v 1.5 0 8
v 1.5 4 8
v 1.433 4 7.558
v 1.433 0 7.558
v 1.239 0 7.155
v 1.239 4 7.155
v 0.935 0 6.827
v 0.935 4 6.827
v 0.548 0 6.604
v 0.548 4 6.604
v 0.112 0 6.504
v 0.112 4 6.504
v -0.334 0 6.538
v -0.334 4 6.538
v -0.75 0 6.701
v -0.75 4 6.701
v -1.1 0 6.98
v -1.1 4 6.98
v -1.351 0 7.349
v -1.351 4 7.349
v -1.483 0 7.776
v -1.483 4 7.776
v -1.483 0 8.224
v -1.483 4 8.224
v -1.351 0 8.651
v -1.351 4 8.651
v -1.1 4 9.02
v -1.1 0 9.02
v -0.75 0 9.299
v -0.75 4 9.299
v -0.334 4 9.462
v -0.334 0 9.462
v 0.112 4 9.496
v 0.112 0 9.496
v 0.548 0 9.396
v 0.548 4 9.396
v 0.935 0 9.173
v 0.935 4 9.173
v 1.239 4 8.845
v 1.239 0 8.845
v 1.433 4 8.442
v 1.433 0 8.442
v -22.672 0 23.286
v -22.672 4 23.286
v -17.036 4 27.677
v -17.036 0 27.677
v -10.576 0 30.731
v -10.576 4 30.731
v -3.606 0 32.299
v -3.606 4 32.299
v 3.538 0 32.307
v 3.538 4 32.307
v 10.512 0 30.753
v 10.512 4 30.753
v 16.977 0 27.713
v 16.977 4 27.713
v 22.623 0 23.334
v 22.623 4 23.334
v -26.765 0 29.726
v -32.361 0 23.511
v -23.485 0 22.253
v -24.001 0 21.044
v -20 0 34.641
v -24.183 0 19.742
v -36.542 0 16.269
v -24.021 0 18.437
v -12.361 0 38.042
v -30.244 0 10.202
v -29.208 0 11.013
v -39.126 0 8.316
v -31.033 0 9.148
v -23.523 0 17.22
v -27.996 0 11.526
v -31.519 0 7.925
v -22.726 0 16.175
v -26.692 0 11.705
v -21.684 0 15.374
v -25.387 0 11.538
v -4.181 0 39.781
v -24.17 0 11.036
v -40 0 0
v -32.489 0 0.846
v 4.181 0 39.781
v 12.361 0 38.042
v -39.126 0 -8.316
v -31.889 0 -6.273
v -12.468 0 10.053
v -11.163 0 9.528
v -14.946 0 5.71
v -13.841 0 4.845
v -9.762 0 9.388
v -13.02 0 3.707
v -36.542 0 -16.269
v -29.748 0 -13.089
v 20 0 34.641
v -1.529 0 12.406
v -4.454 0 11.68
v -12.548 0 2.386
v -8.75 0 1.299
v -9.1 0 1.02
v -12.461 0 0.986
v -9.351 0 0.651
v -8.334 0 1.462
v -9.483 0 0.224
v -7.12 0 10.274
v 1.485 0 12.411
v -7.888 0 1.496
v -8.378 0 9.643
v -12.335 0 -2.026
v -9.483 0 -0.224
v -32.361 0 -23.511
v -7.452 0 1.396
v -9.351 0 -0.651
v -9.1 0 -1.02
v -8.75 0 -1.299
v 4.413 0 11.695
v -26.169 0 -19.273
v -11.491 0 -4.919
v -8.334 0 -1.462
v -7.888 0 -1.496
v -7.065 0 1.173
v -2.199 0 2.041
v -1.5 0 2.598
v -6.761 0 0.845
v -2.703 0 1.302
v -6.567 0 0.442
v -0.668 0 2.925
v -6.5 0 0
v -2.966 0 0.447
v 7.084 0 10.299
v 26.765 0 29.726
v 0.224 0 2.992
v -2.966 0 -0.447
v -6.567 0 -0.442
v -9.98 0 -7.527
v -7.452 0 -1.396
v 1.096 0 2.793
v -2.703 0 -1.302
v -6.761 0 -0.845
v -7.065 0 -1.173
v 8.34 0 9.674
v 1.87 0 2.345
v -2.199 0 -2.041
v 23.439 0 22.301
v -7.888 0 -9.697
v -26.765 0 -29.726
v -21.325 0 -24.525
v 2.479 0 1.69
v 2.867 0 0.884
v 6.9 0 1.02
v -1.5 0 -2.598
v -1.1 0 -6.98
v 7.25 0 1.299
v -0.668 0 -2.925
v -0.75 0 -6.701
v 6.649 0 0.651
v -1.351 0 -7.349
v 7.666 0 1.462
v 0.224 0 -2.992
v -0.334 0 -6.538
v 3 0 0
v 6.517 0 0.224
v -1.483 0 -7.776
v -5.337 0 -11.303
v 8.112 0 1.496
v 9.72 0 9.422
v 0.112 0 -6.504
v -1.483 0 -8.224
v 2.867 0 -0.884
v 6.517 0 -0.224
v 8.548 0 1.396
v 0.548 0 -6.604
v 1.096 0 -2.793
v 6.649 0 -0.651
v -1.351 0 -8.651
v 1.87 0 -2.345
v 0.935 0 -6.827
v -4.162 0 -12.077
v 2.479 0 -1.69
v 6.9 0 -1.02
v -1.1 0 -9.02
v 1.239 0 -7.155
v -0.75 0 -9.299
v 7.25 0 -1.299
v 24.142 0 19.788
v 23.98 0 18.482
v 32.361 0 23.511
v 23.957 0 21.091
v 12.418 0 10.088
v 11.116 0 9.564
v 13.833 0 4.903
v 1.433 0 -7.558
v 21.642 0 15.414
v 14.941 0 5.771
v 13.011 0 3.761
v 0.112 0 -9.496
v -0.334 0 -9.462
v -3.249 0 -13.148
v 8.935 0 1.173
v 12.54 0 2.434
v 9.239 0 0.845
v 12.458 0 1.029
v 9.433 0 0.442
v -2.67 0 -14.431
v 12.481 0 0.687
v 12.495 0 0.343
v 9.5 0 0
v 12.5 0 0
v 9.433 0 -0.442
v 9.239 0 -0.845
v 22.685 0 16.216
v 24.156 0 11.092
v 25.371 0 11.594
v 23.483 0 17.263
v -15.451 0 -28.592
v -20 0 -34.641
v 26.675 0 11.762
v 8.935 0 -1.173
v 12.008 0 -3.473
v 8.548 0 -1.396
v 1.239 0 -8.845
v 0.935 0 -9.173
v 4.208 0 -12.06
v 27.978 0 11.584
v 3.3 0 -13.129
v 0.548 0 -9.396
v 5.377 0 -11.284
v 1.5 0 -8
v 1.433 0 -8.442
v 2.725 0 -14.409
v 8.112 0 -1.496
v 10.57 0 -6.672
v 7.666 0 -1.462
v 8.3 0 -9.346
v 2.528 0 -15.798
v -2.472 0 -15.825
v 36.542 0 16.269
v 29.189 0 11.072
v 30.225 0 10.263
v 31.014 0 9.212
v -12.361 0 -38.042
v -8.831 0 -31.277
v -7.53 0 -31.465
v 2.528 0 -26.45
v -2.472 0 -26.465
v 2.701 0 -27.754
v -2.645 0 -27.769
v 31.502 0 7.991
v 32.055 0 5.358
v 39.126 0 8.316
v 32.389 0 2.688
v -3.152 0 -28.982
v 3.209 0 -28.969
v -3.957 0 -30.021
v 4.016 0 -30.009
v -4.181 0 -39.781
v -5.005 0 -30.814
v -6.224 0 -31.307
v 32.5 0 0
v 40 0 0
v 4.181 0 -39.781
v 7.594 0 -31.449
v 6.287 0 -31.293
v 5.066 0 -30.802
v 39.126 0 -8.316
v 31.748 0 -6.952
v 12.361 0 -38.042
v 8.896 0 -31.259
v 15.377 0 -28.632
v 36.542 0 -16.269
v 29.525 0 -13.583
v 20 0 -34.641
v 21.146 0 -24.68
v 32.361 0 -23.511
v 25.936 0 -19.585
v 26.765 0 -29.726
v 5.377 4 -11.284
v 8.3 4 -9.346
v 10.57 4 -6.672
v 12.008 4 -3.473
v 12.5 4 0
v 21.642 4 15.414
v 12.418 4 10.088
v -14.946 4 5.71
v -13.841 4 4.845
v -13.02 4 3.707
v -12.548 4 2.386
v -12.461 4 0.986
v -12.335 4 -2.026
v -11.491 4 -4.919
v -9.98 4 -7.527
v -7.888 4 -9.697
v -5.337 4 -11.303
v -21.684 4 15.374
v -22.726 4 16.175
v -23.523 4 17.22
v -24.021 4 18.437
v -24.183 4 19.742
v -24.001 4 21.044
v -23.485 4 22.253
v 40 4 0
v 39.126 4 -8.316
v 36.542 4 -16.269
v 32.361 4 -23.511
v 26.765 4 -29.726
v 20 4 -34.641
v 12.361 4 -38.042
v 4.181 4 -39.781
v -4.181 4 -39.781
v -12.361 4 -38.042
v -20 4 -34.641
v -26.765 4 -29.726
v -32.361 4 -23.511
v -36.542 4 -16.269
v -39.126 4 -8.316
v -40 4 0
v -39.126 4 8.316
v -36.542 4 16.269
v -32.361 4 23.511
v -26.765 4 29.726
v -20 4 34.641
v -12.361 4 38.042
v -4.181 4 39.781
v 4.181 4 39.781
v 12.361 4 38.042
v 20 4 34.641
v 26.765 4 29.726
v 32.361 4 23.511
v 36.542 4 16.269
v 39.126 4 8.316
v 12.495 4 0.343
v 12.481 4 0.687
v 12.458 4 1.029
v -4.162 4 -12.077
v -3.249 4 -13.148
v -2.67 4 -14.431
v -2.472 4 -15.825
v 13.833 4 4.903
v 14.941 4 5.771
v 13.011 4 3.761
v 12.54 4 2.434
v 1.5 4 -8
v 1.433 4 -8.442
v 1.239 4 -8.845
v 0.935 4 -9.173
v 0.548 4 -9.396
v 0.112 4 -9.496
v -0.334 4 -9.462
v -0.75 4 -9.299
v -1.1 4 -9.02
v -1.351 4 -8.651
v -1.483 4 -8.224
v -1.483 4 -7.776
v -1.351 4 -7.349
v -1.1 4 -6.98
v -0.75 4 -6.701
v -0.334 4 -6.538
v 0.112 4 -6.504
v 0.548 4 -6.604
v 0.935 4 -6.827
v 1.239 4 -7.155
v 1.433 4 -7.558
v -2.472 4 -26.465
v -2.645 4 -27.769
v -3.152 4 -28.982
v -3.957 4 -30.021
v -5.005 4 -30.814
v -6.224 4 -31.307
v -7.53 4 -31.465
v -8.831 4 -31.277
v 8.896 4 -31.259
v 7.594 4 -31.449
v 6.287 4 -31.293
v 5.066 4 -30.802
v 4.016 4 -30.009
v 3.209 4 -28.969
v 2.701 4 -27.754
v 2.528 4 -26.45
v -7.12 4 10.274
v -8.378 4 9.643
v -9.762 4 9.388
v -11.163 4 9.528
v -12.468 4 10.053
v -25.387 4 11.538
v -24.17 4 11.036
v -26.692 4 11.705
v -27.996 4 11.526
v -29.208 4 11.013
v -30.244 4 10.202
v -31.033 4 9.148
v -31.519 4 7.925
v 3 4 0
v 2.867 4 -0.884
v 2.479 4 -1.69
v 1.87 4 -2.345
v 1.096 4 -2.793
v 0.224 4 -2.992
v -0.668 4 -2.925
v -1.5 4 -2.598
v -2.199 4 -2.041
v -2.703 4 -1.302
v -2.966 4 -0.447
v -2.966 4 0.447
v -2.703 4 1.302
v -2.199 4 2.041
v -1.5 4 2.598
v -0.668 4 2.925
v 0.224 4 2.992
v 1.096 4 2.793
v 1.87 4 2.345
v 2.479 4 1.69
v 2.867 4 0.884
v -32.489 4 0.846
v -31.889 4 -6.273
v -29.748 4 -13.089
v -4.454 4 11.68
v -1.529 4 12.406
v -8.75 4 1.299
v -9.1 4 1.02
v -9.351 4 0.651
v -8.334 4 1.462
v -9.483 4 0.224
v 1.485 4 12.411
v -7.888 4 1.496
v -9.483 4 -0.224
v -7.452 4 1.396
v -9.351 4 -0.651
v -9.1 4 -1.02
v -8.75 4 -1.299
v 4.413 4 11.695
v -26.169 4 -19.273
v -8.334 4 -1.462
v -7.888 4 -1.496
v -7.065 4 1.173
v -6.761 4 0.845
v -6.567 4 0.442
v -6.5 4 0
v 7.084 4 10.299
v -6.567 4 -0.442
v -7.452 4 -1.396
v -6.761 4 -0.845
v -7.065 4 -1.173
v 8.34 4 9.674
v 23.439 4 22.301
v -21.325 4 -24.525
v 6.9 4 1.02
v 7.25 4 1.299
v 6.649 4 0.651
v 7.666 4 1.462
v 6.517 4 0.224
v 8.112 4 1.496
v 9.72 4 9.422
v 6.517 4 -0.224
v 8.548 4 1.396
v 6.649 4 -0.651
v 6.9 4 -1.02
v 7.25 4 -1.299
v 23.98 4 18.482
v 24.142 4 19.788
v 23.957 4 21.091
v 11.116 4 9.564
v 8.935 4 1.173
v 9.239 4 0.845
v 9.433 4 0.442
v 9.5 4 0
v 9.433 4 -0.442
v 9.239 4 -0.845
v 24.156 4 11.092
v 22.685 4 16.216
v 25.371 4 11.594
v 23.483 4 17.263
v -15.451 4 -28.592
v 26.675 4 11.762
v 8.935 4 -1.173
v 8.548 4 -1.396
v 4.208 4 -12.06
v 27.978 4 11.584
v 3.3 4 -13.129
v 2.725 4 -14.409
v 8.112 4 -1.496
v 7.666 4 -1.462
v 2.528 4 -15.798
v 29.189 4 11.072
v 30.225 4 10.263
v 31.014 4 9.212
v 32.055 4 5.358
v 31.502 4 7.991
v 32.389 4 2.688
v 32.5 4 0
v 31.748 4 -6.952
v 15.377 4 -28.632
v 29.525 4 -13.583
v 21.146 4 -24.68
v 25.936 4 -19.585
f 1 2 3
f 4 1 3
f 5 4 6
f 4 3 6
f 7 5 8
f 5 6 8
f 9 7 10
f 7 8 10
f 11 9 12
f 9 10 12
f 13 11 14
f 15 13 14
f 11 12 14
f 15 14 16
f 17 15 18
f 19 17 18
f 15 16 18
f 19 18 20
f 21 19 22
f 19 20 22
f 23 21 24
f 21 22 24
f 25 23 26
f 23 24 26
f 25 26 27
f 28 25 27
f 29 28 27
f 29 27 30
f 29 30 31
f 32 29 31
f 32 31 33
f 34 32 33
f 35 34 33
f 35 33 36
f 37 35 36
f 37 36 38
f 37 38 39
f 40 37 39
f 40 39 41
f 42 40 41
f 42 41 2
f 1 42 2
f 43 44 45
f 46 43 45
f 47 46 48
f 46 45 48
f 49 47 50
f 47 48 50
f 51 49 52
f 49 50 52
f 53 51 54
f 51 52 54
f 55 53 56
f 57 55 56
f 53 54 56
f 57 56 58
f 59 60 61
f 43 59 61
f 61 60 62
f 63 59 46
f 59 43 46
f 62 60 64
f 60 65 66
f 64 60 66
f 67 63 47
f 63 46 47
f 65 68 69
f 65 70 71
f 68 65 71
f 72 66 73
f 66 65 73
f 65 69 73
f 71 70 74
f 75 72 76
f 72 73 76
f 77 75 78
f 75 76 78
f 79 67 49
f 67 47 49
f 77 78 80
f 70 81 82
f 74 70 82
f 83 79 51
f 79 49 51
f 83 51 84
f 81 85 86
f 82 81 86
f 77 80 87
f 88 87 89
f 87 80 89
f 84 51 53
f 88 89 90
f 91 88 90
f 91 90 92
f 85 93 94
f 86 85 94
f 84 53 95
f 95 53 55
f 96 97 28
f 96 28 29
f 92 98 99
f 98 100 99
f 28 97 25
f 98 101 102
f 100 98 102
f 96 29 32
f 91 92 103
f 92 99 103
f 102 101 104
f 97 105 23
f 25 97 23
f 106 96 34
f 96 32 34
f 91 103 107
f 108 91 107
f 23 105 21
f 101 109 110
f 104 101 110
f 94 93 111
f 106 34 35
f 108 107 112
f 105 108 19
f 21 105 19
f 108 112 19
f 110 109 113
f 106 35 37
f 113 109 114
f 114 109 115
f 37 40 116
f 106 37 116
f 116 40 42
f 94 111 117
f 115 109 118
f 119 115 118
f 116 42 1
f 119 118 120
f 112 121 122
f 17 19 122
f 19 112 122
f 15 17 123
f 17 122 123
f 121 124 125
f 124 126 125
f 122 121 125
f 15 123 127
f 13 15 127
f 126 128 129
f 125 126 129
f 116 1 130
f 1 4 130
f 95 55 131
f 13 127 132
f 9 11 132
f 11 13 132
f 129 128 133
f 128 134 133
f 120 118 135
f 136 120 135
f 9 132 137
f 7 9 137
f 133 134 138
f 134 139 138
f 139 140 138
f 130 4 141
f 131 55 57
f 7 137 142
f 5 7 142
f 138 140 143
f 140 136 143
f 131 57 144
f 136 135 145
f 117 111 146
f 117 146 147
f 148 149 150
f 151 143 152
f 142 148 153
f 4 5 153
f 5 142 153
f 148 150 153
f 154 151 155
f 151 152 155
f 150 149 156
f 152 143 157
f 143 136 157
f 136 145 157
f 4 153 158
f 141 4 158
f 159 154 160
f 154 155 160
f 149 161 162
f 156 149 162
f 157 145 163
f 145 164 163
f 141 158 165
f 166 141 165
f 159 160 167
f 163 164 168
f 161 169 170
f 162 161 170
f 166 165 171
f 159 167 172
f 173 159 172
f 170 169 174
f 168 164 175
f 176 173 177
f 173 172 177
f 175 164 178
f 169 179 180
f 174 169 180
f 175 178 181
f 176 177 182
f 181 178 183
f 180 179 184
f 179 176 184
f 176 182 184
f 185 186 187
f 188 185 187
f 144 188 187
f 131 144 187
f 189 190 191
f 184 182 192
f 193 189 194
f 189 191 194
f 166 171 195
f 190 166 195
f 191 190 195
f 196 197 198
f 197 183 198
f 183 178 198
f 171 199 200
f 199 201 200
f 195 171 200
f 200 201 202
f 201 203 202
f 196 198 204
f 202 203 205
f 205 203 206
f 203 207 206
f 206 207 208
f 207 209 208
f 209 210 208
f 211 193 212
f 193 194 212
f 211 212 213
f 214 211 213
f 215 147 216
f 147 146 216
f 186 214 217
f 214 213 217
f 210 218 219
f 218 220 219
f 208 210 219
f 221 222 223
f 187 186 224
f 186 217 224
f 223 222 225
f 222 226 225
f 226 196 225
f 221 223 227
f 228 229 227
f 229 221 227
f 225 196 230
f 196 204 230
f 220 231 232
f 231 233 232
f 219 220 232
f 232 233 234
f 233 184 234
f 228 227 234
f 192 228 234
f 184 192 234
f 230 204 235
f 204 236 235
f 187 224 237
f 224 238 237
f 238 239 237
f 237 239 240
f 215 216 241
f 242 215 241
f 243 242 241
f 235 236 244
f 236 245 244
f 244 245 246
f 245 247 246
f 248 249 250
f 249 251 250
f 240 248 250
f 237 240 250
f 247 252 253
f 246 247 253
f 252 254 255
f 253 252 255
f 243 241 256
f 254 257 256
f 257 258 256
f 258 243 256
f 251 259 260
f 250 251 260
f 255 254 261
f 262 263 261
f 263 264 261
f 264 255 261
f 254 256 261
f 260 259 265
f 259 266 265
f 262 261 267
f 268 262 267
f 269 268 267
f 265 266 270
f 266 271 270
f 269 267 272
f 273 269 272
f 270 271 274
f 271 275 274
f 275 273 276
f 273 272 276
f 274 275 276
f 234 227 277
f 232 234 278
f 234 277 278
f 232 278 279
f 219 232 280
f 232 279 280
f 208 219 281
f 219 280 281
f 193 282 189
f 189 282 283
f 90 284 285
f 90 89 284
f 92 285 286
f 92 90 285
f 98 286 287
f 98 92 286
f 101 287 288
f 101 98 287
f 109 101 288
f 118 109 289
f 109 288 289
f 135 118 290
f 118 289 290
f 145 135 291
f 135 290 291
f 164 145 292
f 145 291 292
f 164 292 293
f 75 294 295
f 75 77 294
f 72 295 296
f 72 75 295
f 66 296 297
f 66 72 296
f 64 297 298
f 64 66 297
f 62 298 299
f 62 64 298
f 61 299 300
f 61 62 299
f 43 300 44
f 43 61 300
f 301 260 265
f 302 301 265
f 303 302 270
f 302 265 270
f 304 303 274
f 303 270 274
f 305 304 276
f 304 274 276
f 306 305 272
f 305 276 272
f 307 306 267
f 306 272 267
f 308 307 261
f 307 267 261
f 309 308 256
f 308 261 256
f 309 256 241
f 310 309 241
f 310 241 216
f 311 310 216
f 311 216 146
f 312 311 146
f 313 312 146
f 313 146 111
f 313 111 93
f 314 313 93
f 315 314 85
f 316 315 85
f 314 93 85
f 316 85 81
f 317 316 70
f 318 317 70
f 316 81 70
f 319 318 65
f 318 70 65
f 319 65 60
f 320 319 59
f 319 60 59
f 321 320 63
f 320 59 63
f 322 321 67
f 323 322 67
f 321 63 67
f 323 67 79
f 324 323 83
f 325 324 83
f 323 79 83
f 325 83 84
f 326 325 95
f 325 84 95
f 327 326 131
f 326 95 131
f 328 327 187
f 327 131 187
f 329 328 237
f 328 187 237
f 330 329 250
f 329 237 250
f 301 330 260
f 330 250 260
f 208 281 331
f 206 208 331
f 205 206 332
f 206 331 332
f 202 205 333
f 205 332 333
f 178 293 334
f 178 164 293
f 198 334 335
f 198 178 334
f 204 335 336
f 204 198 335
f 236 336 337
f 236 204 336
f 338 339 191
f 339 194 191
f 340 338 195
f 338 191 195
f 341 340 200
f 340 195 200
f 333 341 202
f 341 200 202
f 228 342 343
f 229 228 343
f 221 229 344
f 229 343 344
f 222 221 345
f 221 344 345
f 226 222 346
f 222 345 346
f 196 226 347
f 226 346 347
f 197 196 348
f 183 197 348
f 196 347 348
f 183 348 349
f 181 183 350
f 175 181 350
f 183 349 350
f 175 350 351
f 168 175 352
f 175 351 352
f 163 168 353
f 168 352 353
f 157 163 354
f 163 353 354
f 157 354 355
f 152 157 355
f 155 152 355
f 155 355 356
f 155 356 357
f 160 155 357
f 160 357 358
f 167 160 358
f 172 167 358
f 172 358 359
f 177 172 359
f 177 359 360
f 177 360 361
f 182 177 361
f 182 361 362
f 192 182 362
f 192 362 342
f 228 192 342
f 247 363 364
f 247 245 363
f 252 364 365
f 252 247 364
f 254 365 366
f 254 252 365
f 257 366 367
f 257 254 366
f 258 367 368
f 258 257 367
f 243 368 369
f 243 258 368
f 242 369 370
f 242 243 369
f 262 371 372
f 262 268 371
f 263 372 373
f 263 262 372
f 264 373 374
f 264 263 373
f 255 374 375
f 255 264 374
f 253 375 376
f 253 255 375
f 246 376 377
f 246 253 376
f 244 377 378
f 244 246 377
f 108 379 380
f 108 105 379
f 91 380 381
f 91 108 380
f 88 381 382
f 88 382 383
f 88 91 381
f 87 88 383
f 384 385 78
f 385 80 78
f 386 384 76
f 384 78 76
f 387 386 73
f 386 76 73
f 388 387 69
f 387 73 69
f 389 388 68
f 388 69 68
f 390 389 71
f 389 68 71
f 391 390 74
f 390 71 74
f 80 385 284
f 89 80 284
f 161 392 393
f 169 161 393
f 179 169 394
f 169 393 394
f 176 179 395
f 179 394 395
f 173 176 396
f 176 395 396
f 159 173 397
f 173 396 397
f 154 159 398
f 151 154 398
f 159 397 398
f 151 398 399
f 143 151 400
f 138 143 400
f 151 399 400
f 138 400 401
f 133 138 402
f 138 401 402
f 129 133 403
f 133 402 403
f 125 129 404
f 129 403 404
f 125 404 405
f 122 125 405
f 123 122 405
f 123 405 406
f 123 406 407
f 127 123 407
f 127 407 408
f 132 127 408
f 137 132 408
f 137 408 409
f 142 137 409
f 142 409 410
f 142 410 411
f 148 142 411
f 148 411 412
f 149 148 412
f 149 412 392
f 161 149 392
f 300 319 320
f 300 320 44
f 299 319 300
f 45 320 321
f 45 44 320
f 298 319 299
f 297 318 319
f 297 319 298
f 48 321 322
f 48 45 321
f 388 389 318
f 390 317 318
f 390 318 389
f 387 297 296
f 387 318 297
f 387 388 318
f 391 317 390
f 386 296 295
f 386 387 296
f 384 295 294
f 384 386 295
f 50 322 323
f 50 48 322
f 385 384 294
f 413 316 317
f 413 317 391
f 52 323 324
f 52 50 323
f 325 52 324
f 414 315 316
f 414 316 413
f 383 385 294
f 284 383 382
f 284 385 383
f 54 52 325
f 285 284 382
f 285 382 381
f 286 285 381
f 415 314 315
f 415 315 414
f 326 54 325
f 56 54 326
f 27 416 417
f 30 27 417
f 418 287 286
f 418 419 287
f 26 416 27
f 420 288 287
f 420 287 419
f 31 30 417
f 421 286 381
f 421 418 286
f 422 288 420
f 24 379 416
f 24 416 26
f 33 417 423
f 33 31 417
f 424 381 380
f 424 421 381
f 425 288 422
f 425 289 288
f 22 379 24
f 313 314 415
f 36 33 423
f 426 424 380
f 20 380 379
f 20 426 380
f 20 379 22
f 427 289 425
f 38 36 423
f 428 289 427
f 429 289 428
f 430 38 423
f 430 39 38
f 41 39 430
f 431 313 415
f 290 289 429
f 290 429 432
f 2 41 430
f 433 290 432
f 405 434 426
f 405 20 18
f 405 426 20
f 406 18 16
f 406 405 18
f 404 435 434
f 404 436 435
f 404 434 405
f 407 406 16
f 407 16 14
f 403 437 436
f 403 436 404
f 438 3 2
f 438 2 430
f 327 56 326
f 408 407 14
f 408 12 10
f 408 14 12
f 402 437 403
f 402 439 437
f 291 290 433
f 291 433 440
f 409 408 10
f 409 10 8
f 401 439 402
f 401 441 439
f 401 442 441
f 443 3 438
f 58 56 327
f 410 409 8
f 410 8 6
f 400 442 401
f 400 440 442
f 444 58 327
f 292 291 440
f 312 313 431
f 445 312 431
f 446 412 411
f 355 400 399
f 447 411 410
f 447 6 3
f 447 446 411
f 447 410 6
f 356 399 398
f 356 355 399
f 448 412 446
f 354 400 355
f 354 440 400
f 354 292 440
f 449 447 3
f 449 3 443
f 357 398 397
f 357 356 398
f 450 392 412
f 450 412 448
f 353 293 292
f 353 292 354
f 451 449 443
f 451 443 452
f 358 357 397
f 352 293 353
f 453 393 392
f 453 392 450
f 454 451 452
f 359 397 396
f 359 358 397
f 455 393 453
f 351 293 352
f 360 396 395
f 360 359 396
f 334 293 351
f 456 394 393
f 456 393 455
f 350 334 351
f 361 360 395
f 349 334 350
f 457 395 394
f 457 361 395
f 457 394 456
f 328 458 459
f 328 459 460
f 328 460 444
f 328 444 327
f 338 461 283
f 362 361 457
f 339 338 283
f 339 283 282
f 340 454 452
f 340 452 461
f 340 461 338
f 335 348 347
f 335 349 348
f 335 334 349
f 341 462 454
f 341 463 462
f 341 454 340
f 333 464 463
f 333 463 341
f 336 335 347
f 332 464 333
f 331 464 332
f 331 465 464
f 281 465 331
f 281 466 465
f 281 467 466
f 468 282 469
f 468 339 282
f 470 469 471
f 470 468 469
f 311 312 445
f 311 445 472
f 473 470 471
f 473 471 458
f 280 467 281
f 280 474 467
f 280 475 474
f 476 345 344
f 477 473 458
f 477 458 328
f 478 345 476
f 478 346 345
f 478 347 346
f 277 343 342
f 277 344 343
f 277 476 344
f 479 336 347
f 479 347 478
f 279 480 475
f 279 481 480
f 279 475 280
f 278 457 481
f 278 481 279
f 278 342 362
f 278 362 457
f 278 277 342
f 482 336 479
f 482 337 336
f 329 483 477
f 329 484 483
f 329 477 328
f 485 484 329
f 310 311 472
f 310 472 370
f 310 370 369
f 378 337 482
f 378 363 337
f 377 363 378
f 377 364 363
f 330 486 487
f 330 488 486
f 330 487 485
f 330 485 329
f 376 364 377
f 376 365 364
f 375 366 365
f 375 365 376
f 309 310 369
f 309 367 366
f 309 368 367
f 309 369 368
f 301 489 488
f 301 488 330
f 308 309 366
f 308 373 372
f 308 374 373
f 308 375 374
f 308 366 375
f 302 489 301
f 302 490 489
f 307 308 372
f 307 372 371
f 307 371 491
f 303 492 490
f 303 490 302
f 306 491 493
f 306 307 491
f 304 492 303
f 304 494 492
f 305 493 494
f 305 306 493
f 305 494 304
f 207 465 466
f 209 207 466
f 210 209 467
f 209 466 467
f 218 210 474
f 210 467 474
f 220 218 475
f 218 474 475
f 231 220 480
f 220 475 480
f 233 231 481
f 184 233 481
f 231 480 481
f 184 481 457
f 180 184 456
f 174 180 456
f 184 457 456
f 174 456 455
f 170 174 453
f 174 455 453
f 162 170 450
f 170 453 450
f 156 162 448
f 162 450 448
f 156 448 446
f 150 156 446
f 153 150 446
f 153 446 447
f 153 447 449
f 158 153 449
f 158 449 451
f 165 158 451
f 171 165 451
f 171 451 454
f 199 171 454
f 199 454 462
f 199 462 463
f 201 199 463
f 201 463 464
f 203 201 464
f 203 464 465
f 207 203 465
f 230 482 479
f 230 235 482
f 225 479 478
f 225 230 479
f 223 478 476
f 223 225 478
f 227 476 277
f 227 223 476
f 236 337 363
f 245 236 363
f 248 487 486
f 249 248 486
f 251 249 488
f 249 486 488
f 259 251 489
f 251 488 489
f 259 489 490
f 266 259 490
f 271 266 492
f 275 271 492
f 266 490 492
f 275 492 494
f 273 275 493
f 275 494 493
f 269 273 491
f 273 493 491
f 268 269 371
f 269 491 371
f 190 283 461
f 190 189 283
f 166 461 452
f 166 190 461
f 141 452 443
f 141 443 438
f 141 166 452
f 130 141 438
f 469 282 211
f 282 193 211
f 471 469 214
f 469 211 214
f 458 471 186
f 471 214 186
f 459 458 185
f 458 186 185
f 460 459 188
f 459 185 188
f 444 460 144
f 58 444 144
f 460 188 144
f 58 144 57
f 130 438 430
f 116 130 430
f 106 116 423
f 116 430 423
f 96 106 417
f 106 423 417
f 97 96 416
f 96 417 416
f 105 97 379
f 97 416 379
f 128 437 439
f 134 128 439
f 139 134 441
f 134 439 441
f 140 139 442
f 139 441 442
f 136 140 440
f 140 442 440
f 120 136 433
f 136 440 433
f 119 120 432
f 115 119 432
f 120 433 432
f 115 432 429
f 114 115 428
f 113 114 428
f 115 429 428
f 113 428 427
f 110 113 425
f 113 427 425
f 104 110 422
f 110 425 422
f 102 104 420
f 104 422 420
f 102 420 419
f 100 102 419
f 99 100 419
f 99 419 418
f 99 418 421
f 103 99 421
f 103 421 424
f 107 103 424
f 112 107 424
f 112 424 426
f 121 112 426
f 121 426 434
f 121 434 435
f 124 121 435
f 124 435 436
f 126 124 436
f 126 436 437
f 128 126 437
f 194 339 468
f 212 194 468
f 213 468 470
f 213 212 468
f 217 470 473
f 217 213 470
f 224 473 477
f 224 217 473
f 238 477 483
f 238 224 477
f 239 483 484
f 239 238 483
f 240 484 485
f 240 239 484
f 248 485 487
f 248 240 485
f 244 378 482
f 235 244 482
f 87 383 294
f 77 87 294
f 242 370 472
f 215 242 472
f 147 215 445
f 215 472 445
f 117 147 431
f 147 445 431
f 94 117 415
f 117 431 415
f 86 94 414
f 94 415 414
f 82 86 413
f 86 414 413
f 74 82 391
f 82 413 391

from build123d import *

# Parameters (mm, degrees)
SKETCH_1_R          = 40
EXTRUDE_1_DEPTH     = 4
SKETCH_2_R          = 1.5
SKETCH_2_R_2        = 3
CUT_EXTRUDE_1_DEPTH = 5
CUT_EXTRUDE_2_DEPTH = 10
FILLET_1_R          = 5


with BuildPart() as part:
    # 草图1 → 凸台-拉伸1 (new body)
    with BuildSketch(Plane(origin=(0, 0, 0), x_dir=(1, 0, 0), z_dir=(0, 1, 0))):
        Circle(SKETCH_1_R)
    extrude(amount=EXTRUDE_1_DEPTH)

    # 草图2 → 切除-拉伸1 (cut, through all)
    with BuildSketch(Plane(origin=(0, 4, 0), x_dir=(1, 0, 0), z_dir=(0, 1, 0))):
        with Locations((8, 0)):
            Circle(SKETCH_2_R)
        with Locations((0, 8)):
            Circle(SKETCH_2_R)
        with Locations((-8, 0)):
            Circle(SKETCH_2_R)
        with Locations((0, -8)):
            Circle(SKETCH_2_R)
        Circle(SKETCH_2_R_2)
    extrude(amount=-CUT_EXTRUDE_1_DEPTH, mode=Mode.SUBTRACT)

    # 草图3 → 切除-拉伸2 (cut)
    with BuildSketch(Plane(origin=(0, 4, 0), x_dir=(1, 0, 0), z_dir=(0, 1, 0))):
        with BuildLine():
            Line((-29.324463582, -14.011632155), (-11.86555962, -3.931729252))
            ThreePointArc((-11.86555962, -3.931729252), (-10.811101802, 6.274557978), (-2.472197603, 12.253090998))
            Line((-2.472197603, 12.253090998), (-2.472197603, 32.405836496))
            ThreePointArc((-2.472197603, 32.405836496), (-28.131872753, 16.274143154), (-29.324463582, -14.011632155))
        make_face()
        with BuildLine():
            ThreePointArc((12.5, 0), (12.335818498, -2.019302353), (11.847586881, -3.985559571))
            Line((11.847586881, -3.985559571), (29.300376438, -14.06193232))
            ThreePointArc((29.300376438, -14.06193232), (31.69000027, -7.210678392), (32.5, 0))
            ThreePointArc((32.5, 0), (23.857950225, 22.069168789), (2.527802397, 32.401546492))
            Line((2.527802397, 32.401546492), (2.527802397, 12.241740687))
            ThreePointArc((2.527802397, 12.241740687), (9.691427396, 7.894696639), (12.5, 0))
        make_face()
        with BuildLine():
            Line((26.796661185, -18.389914337), (9.337757223, -8.310011435))
            ThreePointArc((9.337757223, -8.310011435), (-0.028375705, -12.499967793), (-9.375389278, -8.267531427))
            Line((-9.375389278, -8.267531427), (-26.828178835, -18.343904176))
            ThreePointArc((-26.828178835, -18.343904176), (-0.027885019, -32.499988037), (26.796661185, -18.389914337))
        make_face()
    extrude(amount=-CUT_EXTRUDE_2_DEPTH, mode=Mode.SUBTRACT)

    # 圆角1
    fillet_1_edges = [part.edges().sort_by_distance(p)[0] for p in [
        (11.847586881, 2, 3.985559571),
        (2.527802397, 2, -12.241740687),
        (2.527802397, 2, -32.401546492),
        (29.300376438, 2, 14.06193232),
        (-9.375389278, 2, 8.267531427),
        (9.337757223, 2, 8.310011435),
        (26.796661185, 2, 18.389914337),
        (-26.828178835, 2, 18.343904176),
        (-2.472197603, 2, -12.253090998),
        (-11.86555962, 2, 3.931729252),
        (-29.324463582, 2, 14.011632155),
        (-2.472197603, 2, -32.405836496),
    ]]
    fillet(fillet_1_edges, radius=FILLET_1_R)


solid = part.part
